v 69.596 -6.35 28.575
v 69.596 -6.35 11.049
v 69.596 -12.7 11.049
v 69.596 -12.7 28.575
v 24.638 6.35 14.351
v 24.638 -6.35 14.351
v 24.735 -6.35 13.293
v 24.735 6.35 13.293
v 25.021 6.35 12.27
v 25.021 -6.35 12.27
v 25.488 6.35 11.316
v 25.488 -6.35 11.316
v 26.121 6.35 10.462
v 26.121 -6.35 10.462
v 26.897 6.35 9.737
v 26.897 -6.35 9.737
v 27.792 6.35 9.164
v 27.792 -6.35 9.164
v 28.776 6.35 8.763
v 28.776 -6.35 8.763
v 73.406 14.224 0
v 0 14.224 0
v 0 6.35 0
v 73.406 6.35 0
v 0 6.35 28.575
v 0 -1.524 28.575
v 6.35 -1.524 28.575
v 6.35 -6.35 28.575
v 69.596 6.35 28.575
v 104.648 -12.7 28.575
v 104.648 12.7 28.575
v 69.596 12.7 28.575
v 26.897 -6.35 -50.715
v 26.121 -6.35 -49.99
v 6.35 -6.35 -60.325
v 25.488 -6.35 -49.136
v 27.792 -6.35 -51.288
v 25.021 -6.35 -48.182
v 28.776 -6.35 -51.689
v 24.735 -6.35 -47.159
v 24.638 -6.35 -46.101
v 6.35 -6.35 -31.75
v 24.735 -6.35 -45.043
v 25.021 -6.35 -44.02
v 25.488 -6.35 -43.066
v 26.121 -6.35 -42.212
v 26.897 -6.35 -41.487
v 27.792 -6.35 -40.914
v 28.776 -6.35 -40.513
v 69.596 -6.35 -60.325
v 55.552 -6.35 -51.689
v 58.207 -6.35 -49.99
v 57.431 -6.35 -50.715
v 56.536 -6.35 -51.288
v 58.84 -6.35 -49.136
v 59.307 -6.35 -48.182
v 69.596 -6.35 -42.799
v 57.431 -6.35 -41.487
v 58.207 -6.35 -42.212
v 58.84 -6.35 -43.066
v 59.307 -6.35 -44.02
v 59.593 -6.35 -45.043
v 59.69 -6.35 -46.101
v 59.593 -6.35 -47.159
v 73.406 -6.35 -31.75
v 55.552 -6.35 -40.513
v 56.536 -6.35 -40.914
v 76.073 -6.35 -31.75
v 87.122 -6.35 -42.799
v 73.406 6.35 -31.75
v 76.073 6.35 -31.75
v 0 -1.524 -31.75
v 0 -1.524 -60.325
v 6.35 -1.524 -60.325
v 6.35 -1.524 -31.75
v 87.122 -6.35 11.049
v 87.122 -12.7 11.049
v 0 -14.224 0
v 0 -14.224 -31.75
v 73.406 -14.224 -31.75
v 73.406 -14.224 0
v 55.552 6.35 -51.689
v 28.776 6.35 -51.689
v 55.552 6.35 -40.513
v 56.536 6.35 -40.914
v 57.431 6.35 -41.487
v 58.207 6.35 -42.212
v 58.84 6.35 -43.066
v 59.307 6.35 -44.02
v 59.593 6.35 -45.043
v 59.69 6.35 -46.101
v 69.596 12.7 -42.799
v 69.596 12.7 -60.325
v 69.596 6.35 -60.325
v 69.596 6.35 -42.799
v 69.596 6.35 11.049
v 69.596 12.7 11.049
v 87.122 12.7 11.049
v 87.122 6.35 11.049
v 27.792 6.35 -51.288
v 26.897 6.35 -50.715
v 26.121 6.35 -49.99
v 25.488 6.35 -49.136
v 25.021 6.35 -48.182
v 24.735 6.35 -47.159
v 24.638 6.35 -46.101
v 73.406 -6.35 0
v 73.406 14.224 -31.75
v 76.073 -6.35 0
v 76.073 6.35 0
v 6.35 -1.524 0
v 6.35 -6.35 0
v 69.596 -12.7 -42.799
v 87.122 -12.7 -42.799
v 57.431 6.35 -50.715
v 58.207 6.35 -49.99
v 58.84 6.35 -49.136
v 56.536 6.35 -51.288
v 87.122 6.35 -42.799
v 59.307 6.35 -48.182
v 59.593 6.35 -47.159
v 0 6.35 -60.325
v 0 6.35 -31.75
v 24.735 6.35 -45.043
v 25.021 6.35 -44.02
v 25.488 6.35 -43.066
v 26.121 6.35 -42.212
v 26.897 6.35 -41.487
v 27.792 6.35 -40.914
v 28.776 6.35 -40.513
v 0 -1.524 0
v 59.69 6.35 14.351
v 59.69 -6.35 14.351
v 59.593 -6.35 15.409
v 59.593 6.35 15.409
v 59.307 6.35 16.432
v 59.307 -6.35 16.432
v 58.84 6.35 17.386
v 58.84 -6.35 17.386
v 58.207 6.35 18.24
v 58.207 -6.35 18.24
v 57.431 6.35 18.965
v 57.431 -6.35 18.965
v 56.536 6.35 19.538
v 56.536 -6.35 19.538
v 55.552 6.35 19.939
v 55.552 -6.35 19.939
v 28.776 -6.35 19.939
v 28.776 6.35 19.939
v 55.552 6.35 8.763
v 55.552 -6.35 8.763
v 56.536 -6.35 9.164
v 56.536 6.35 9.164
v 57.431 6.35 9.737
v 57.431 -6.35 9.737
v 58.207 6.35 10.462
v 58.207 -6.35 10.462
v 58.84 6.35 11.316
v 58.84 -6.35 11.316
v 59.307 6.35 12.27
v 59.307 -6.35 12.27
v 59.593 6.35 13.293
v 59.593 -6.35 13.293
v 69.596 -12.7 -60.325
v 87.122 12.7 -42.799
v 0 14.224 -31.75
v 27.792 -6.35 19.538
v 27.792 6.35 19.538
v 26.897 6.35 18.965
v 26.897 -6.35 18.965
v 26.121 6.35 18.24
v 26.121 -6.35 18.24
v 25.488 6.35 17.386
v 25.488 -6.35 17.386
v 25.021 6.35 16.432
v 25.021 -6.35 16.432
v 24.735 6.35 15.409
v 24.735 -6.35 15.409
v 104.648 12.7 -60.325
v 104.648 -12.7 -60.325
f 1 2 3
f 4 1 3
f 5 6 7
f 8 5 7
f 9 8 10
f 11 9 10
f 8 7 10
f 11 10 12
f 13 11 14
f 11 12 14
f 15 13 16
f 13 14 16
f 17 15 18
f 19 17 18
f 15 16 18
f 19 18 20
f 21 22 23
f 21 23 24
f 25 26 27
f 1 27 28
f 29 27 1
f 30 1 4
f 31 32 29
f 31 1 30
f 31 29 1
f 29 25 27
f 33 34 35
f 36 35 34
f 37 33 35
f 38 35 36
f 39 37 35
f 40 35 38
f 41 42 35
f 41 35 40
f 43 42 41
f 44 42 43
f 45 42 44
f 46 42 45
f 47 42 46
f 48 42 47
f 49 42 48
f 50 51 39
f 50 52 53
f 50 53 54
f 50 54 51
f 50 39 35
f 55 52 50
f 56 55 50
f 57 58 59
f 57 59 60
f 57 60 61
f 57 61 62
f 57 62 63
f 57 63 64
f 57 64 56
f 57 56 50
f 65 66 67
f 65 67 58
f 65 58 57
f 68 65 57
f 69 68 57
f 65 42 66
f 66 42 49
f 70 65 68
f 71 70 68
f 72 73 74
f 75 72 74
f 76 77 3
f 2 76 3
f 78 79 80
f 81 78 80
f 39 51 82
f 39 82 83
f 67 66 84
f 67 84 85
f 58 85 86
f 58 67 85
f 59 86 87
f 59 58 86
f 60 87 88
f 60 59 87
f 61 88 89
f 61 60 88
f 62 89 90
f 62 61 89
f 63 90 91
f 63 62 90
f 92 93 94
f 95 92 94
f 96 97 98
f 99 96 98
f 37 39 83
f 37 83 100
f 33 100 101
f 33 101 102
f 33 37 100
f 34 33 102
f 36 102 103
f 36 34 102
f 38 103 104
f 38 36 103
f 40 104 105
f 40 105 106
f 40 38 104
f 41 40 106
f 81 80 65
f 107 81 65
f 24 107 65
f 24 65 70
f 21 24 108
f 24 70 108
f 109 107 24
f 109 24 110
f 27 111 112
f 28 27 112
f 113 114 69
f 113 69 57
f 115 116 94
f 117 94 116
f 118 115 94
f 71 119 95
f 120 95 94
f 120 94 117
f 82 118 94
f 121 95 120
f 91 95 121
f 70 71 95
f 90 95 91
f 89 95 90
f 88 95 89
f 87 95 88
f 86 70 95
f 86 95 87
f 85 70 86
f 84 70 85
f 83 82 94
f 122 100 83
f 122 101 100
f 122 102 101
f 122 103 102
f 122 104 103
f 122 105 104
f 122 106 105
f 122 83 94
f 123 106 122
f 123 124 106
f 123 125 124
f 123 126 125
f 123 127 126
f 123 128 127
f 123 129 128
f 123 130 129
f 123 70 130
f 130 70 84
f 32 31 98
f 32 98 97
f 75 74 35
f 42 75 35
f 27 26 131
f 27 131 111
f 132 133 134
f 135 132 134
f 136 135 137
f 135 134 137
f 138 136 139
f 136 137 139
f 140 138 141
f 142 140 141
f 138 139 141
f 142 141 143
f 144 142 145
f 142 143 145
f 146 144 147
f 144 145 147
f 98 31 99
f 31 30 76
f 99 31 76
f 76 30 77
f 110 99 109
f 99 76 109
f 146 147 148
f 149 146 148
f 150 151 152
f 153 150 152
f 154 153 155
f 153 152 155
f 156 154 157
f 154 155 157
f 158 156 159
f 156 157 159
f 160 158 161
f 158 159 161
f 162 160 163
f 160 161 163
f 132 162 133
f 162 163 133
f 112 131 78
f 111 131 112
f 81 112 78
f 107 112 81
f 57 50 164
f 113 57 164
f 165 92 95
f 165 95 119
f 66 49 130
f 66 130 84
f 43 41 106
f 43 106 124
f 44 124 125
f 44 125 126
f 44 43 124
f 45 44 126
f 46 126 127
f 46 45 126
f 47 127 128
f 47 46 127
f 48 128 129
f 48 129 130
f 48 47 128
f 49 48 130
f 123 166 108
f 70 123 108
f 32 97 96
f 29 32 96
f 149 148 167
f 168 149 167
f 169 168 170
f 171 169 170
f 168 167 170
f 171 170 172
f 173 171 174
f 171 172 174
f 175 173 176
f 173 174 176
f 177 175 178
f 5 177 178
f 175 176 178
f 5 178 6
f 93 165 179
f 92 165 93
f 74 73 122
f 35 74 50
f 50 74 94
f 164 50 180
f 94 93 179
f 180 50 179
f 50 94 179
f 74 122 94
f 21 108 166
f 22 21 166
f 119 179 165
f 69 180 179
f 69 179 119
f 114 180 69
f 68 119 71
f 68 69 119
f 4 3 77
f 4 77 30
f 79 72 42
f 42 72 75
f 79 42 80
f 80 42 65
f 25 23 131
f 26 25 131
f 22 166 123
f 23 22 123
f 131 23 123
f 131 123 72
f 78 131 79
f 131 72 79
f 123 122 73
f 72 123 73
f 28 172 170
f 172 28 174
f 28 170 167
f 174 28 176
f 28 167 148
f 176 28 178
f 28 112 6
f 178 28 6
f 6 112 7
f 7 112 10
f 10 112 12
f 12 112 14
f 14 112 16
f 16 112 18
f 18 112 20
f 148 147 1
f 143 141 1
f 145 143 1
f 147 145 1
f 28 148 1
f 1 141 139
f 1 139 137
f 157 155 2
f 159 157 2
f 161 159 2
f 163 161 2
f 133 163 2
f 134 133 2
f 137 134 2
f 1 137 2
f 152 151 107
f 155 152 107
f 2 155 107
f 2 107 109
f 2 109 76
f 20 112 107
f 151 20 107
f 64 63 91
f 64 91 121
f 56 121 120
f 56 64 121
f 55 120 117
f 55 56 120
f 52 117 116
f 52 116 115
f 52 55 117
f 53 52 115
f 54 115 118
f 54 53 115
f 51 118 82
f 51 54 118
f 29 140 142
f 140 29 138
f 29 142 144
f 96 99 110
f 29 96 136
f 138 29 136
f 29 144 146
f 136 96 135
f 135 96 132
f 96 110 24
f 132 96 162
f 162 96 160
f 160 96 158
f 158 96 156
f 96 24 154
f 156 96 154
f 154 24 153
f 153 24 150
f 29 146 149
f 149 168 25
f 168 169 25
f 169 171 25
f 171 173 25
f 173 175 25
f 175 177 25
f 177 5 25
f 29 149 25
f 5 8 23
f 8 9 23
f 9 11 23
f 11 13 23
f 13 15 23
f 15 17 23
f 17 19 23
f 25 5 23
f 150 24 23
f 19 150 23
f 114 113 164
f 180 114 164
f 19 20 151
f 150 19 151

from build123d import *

# Parameters (mm, degrees)
F0_W      = 31.242
F0_H      = 12.7
F1_DEPTH  = 28.575
F0_W_2    = 69.596
F0_H_2    = 6.35
F2_DEPTH  = 15.875
F4_DEPTH  = 26.925
F6_DEPTH  = 20.575
F9_DEPTH  = 6.35
F10_DEPTH = 6.35


with BuildPart() as f1:
    # F0 (on Top) → F1 (new body)
    with BuildSketch(Plane.XY):
        with Locations((89.027, 6.35)):
            Rectangle(F0_W, F0_H)
        with Locations((89.027, -6.35)):
            Rectangle(F0_W, F0_H)
        Polygon((73.406, 0), (0, 0), (0, -1.524), (6.35, -1.524), (6.35, -6.35), (69.596, -6.35), (69.596, -12.7), (73.406, -12.7), align=None)
        Polygon((0, 6.35), (0, 0), (73.406, 0), (73.406, 12.7), (69.596, 12.7), (69.596, 6.35), align=None)
    extrude(amount=F1_DEPTH)

    # F0 (on Top) → F2 (join)
    with BuildSketch(Plane.XY):
        with Locations((34.798, 9.525)):
            Rectangle(F0_W_2, F0_H_2)
        Polygon((0, 6.35), (0, 0), (73.406, 0), (73.406, 12.7), (69.596, 12.7), (69.596, 6.35), align=None)
        Polygon((73.406, 0), (0, 0), (0, -1.524), (6.35, -1.524), (6.35, -6.35), (69.596, -6.35), (69.596, -12.7), (73.406, -12.7), align=None)
        Polygon((6.35, -1.524), (0, -1.524), (0, -6.35), (0, -12.7), (69.596, -12.7), (69.596, -6.35), (6.35, -6.35), align=None)
        Polygon((73.406, -14.224), (73.406, -12.7), (69.596, -12.7), (0, -12.7), (0, -14.224), align=None)
        Polygon((69.596, 12.7), (73.406, 12.7), (73.406, 14.224), (0, 14.224), (0, 12.7), align=None)
    extrude(amount=-F2_DEPTH)

    # F3 (on face) → F4 (cut, through all)
    with BuildSketch(Plane.XZ.offset(12.7)):
        Polygon((104.648, 0), (104.648, 28.575), (76.073, 0), align=None)
    extrude(amount=-F4_DEPTH, mode=Mode.SUBTRACT)

    # F5 (on face) → F6 (cut, through all)
    with BuildSketch(Plane.XZ.offset(6.35)):
        with BuildLine():
            ThreePointArc((28.7761162011, 19.939), (25.7851595792, 17.8276992138), (24.638, 14.351))
            Line((24.638, 14.351), (30.48, 14.351))
            Line((30.48, 14.351), (36.322, 14.351))
            ThreePointArc((36.322, 14.351), (35.1748404208, 17.8276992138), (32.1838837989, 19.939))
            Line((32.1838837989, 19.939), (28.7761162011, 19.939))
        make_face()
        with BuildLine():
            Line((30.48, 14.351), (24.638, 14.351))
            ThreePointArc((24.638, 14.351), (25.7851595792, 10.8743007862), (28.7761162011, 8.763))
            Line((28.7761162011, 8.763), (32.1838837989, 8.763))
            ThreePointArc((32.1838837989, 8.763), (35.1748404208, 10.8743007862), (36.322, 14.351))
            Line((36.322, 14.351), (30.48, 14.351))
        make_face()
        with BuildLine():
            ThreePointArc((32.1838837989, 19.939), (35.1748404208, 17.8276992138), (36.322, 14.351))
            Line((36.322, 14.351), (48.006, 14.351))
            ThreePointArc((48.006, 14.351), (49.1531595792, 17.8276992138), (52.1441162011, 19.939))
            Line((52.1441162011, 19.939), (32.1838837989, 19.939))
        make_face()
        with BuildLine():
            ThreePointArc((52.1441162011, 19.939), (49.1531595792, 17.8276992138), (48.006, 14.351))
            Line((48.006, 14.351), (53.848, 14.351))
            Line((53.848, 14.351), (59.69, 14.351))
            ThreePointArc((59.69, 14.351), (58.5428404208, 17.8276992138), (55.5518837989, 19.939))
            Line((55.5518837989, 19.939), (52.1441162011, 19.939))
        make_face()
        with BuildLine():
            Line((53.848, 14.351), (48.006, 14.351))
            ThreePointArc((48.006, 14.351), (49.1531595792, 10.8743007862), (52.1441162011, 8.763))
            Line((52.1441162011, 8.763), (55.5518837989, 8.763))
            ThreePointArc((55.5518837989, 8.763), (58.5428404208, 10.8743007862), (59.69, 14.351))
            Line((59.69, 14.351), (53.848, 14.351))
        make_face()
        with BuildLine():
            Line((48.006, 14.351), (36.322, 14.351))
            ThreePointArc((36.322, 14.351), (35.1748404208, 10.8743007862), (32.1838837989, 8.763))
            Line((32.1838837989, 8.763), (52.1441162011, 8.763))
            ThreePointArc((52.1441162011, 8.763), (49.1531595792, 10.8743007862), (48.006, 14.351))
        make_face()
    extrude(amount=-F6_DEPTH, mode=Mode.SUBTRACT)

    # F8 (on face) → F9 (cut)
    with BuildSketch(Plane(origin=(0, 12.7, 0), x_dir=(-1, 0, 0), z_dir=(0, 1, 0))):
        Polygon((-69.596, 0), (-69.596, 11.049), (-87.122, 11.049), (-76.073, 0), (-73.406, 0), align=None)
    extrude(amount=-F9_DEPTH, mode=Mode.SUBTRACT)

    # F7 (on face) → F10 (cut)
    with BuildSketch(Plane.XZ.offset(12.7)):
        Polygon((87.122, 11.049), (69.596, 11.049), (69.596, 0), (73.406, 0), (76.073, 0), align=None)
    extrude(amount=-F10_DEPTH, mode=Mode.SUBTRACT)

    # F11: F1 across face


with BuildPart() as f1_1:
    add(f1.part)
    add(f1.part.mirror(Plane(origin=(36.703, 0, -15.875), x_dir=(1, 0, 0), z_dir=(0, 0, -1))))


solid = f1_1.part
